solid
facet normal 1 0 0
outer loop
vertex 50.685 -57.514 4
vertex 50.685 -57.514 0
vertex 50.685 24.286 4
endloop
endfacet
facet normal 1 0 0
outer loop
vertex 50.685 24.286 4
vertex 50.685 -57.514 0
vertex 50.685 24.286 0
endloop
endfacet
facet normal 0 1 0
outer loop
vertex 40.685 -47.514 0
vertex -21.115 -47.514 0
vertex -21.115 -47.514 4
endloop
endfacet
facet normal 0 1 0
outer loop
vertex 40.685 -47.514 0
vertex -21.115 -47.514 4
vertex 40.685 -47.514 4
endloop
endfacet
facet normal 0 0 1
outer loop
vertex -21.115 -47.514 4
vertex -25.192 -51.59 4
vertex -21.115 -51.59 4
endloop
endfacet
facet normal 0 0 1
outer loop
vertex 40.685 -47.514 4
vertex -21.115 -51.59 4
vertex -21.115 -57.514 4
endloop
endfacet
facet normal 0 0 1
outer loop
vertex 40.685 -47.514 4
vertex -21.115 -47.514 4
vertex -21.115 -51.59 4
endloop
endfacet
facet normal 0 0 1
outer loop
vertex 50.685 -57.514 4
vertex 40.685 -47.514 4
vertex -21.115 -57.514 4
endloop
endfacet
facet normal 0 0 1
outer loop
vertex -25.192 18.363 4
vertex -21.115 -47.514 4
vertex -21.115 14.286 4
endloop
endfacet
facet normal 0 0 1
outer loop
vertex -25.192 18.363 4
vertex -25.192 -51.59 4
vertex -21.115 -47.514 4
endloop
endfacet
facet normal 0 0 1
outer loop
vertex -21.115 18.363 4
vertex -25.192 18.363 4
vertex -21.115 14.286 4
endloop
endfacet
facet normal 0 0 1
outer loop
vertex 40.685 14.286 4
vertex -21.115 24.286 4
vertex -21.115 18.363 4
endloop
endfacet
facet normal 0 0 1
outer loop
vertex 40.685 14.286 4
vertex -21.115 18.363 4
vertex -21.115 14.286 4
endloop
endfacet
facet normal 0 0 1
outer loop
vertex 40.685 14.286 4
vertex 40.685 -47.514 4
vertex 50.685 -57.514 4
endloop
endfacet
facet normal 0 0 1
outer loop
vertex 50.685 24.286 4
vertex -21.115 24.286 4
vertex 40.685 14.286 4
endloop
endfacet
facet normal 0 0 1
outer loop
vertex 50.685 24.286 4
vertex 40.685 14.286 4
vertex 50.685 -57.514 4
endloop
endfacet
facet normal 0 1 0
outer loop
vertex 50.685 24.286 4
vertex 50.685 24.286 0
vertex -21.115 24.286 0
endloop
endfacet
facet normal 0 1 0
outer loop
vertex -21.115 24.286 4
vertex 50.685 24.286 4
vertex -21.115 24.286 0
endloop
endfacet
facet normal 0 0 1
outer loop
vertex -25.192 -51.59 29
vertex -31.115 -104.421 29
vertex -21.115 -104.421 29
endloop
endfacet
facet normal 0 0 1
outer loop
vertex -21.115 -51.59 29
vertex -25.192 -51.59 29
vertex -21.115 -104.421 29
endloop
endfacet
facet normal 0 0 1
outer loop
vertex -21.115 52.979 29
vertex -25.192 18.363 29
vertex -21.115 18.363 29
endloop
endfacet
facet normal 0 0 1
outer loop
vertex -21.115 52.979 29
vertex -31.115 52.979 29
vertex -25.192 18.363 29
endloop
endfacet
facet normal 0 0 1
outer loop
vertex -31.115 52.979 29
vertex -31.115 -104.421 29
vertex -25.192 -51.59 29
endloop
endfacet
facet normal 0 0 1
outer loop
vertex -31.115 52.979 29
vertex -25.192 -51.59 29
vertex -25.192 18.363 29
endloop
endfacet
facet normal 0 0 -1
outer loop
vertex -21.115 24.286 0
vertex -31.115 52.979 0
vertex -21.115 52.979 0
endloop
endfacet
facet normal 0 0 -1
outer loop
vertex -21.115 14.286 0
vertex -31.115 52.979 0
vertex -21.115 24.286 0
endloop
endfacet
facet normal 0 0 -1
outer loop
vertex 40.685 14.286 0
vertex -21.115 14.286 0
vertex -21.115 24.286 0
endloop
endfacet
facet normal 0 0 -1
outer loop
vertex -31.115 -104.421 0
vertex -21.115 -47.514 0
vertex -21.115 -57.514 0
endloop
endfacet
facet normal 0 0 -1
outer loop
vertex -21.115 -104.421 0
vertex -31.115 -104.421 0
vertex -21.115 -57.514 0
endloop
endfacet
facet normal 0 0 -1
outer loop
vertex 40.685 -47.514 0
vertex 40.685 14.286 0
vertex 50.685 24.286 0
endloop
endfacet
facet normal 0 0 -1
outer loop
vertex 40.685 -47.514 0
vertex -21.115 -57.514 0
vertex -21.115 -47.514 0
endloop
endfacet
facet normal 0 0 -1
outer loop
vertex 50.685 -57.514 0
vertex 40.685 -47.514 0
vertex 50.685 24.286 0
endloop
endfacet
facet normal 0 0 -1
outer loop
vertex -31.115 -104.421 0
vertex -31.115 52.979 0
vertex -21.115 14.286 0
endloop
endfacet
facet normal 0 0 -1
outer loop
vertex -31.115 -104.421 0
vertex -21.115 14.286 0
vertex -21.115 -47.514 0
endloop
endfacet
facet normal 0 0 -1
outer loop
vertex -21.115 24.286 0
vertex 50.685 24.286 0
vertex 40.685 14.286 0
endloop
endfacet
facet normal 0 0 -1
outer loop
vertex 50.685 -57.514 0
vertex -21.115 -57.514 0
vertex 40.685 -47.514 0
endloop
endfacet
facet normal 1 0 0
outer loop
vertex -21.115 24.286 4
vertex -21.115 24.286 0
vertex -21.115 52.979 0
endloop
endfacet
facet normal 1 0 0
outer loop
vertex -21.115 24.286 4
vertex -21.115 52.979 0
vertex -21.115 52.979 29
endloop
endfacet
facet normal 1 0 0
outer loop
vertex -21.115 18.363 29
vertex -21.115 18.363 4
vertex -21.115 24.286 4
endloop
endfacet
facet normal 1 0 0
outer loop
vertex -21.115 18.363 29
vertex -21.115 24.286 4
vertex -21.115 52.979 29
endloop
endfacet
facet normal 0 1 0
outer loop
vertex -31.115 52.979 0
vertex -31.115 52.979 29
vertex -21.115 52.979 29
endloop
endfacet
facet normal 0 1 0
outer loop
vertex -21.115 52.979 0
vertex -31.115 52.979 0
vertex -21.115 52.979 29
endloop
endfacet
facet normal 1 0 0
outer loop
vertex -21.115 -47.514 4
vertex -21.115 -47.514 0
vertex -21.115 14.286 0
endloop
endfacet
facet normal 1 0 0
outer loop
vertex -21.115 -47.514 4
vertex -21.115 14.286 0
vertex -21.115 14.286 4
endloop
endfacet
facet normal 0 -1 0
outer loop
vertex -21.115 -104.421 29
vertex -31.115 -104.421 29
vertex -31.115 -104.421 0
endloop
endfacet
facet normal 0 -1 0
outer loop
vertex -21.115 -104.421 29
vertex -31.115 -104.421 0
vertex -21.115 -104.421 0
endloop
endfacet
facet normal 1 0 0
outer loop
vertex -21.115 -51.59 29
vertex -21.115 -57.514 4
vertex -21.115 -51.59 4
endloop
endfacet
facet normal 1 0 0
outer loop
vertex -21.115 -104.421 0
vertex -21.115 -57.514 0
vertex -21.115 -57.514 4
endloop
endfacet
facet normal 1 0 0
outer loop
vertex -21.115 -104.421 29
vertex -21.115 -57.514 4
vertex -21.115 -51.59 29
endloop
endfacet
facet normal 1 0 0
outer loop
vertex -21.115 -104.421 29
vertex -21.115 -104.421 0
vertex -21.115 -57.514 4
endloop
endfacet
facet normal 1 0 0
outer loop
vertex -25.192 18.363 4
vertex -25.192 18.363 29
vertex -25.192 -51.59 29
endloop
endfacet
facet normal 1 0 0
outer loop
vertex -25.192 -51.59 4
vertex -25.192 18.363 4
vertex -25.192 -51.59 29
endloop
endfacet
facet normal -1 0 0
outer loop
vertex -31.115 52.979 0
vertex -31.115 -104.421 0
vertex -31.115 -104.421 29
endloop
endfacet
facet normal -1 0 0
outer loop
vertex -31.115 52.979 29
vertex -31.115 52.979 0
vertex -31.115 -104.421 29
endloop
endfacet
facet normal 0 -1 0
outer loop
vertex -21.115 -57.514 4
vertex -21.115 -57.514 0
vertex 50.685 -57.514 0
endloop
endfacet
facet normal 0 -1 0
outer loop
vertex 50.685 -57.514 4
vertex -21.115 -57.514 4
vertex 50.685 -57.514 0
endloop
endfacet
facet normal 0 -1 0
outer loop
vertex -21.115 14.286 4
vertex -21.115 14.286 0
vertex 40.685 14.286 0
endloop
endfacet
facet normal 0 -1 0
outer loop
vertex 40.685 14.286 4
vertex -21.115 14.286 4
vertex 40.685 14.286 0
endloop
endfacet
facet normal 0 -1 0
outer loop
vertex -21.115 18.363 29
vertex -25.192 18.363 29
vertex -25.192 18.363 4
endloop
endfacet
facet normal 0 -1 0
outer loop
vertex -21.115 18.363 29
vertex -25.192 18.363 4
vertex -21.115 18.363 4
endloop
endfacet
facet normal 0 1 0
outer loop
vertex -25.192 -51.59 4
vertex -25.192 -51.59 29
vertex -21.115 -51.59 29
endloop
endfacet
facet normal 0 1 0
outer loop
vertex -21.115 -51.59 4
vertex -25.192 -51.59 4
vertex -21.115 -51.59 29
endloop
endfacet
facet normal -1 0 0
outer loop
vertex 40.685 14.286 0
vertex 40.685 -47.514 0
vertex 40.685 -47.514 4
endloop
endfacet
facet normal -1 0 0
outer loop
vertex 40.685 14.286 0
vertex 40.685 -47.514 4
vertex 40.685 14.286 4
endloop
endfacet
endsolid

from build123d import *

# Parameters (mm, degrees)
F1_W      = 61.8
F1_H      = 61.8
F1_W_2    = 10
F1_H_2    = 46.907837
F2_DEPTH  = 4
F3_W      = 10
F3_H      = 48.056386
F4_DEPTH  = 25
F4_FACE_W = 10
F4_FACE_H = 29
F5_DEPTH  = 157.4
F6_W      = 4.076856
F6_H      = 61.8
F6_H_2    = 4.076856
F7_DEPTH  = 25


with BuildPart() as f2:
    # F1 (on Top) → F2 (new body)
    with BuildSketch(Plane.XY):
        Polygon((50.684865, 24.286445), (-31.115135, 24.286445), (-31.115135, -57.513555), (-21.115135, -57.513555), (50.684865, -57.513555), align=None)
        with Locations((9.784865, -16.613555)):
            Rectangle(F1_W, F1_H, mode=Mode.SUBTRACT)
        with Locations((-26.115135, -80.967473)):
            Rectangle(F1_W_2, F1_H_2)
    extrude(amount=F2_DEPTH)

    # F3 (on face) → F4 (join)
    with BuildSketch(Plane.XY.offset(4)):
        with Locations((-26.115135, -80.393199)):
            Rectangle(F3_W, F3_H)
    extrude(amount=F4_DEPTH)

    # F4_face (on face) → F5 (join)
    with BuildSketch(Plane(origin=(-26.115135, -104.421392, 14.5), x_dir=(1, 0, 0), z_dir=(0, -1, 0))):
        Rectangle(F4_FACE_W, F4_FACE_H)
    extrude(amount=-F5_DEPTH)

    # F6 (on face) → F7 (cut)
    with BuildSketch(Plane.XY.offset(29)):
        with Locations((-23.153563, -16.613555)):
            Rectangle(F6_W, F6_H)
        with Locations((-23.153563, 16.324873)):
            Rectangle(F6_W, F6_H_2)
        with Locations((-23.153563, -49.551983)):
            Rectangle(F6_W, F6_H_2)
    extrude(amount=-F7_DEPTH, mode=Mode.SUBTRACT)


solid = f2.part
